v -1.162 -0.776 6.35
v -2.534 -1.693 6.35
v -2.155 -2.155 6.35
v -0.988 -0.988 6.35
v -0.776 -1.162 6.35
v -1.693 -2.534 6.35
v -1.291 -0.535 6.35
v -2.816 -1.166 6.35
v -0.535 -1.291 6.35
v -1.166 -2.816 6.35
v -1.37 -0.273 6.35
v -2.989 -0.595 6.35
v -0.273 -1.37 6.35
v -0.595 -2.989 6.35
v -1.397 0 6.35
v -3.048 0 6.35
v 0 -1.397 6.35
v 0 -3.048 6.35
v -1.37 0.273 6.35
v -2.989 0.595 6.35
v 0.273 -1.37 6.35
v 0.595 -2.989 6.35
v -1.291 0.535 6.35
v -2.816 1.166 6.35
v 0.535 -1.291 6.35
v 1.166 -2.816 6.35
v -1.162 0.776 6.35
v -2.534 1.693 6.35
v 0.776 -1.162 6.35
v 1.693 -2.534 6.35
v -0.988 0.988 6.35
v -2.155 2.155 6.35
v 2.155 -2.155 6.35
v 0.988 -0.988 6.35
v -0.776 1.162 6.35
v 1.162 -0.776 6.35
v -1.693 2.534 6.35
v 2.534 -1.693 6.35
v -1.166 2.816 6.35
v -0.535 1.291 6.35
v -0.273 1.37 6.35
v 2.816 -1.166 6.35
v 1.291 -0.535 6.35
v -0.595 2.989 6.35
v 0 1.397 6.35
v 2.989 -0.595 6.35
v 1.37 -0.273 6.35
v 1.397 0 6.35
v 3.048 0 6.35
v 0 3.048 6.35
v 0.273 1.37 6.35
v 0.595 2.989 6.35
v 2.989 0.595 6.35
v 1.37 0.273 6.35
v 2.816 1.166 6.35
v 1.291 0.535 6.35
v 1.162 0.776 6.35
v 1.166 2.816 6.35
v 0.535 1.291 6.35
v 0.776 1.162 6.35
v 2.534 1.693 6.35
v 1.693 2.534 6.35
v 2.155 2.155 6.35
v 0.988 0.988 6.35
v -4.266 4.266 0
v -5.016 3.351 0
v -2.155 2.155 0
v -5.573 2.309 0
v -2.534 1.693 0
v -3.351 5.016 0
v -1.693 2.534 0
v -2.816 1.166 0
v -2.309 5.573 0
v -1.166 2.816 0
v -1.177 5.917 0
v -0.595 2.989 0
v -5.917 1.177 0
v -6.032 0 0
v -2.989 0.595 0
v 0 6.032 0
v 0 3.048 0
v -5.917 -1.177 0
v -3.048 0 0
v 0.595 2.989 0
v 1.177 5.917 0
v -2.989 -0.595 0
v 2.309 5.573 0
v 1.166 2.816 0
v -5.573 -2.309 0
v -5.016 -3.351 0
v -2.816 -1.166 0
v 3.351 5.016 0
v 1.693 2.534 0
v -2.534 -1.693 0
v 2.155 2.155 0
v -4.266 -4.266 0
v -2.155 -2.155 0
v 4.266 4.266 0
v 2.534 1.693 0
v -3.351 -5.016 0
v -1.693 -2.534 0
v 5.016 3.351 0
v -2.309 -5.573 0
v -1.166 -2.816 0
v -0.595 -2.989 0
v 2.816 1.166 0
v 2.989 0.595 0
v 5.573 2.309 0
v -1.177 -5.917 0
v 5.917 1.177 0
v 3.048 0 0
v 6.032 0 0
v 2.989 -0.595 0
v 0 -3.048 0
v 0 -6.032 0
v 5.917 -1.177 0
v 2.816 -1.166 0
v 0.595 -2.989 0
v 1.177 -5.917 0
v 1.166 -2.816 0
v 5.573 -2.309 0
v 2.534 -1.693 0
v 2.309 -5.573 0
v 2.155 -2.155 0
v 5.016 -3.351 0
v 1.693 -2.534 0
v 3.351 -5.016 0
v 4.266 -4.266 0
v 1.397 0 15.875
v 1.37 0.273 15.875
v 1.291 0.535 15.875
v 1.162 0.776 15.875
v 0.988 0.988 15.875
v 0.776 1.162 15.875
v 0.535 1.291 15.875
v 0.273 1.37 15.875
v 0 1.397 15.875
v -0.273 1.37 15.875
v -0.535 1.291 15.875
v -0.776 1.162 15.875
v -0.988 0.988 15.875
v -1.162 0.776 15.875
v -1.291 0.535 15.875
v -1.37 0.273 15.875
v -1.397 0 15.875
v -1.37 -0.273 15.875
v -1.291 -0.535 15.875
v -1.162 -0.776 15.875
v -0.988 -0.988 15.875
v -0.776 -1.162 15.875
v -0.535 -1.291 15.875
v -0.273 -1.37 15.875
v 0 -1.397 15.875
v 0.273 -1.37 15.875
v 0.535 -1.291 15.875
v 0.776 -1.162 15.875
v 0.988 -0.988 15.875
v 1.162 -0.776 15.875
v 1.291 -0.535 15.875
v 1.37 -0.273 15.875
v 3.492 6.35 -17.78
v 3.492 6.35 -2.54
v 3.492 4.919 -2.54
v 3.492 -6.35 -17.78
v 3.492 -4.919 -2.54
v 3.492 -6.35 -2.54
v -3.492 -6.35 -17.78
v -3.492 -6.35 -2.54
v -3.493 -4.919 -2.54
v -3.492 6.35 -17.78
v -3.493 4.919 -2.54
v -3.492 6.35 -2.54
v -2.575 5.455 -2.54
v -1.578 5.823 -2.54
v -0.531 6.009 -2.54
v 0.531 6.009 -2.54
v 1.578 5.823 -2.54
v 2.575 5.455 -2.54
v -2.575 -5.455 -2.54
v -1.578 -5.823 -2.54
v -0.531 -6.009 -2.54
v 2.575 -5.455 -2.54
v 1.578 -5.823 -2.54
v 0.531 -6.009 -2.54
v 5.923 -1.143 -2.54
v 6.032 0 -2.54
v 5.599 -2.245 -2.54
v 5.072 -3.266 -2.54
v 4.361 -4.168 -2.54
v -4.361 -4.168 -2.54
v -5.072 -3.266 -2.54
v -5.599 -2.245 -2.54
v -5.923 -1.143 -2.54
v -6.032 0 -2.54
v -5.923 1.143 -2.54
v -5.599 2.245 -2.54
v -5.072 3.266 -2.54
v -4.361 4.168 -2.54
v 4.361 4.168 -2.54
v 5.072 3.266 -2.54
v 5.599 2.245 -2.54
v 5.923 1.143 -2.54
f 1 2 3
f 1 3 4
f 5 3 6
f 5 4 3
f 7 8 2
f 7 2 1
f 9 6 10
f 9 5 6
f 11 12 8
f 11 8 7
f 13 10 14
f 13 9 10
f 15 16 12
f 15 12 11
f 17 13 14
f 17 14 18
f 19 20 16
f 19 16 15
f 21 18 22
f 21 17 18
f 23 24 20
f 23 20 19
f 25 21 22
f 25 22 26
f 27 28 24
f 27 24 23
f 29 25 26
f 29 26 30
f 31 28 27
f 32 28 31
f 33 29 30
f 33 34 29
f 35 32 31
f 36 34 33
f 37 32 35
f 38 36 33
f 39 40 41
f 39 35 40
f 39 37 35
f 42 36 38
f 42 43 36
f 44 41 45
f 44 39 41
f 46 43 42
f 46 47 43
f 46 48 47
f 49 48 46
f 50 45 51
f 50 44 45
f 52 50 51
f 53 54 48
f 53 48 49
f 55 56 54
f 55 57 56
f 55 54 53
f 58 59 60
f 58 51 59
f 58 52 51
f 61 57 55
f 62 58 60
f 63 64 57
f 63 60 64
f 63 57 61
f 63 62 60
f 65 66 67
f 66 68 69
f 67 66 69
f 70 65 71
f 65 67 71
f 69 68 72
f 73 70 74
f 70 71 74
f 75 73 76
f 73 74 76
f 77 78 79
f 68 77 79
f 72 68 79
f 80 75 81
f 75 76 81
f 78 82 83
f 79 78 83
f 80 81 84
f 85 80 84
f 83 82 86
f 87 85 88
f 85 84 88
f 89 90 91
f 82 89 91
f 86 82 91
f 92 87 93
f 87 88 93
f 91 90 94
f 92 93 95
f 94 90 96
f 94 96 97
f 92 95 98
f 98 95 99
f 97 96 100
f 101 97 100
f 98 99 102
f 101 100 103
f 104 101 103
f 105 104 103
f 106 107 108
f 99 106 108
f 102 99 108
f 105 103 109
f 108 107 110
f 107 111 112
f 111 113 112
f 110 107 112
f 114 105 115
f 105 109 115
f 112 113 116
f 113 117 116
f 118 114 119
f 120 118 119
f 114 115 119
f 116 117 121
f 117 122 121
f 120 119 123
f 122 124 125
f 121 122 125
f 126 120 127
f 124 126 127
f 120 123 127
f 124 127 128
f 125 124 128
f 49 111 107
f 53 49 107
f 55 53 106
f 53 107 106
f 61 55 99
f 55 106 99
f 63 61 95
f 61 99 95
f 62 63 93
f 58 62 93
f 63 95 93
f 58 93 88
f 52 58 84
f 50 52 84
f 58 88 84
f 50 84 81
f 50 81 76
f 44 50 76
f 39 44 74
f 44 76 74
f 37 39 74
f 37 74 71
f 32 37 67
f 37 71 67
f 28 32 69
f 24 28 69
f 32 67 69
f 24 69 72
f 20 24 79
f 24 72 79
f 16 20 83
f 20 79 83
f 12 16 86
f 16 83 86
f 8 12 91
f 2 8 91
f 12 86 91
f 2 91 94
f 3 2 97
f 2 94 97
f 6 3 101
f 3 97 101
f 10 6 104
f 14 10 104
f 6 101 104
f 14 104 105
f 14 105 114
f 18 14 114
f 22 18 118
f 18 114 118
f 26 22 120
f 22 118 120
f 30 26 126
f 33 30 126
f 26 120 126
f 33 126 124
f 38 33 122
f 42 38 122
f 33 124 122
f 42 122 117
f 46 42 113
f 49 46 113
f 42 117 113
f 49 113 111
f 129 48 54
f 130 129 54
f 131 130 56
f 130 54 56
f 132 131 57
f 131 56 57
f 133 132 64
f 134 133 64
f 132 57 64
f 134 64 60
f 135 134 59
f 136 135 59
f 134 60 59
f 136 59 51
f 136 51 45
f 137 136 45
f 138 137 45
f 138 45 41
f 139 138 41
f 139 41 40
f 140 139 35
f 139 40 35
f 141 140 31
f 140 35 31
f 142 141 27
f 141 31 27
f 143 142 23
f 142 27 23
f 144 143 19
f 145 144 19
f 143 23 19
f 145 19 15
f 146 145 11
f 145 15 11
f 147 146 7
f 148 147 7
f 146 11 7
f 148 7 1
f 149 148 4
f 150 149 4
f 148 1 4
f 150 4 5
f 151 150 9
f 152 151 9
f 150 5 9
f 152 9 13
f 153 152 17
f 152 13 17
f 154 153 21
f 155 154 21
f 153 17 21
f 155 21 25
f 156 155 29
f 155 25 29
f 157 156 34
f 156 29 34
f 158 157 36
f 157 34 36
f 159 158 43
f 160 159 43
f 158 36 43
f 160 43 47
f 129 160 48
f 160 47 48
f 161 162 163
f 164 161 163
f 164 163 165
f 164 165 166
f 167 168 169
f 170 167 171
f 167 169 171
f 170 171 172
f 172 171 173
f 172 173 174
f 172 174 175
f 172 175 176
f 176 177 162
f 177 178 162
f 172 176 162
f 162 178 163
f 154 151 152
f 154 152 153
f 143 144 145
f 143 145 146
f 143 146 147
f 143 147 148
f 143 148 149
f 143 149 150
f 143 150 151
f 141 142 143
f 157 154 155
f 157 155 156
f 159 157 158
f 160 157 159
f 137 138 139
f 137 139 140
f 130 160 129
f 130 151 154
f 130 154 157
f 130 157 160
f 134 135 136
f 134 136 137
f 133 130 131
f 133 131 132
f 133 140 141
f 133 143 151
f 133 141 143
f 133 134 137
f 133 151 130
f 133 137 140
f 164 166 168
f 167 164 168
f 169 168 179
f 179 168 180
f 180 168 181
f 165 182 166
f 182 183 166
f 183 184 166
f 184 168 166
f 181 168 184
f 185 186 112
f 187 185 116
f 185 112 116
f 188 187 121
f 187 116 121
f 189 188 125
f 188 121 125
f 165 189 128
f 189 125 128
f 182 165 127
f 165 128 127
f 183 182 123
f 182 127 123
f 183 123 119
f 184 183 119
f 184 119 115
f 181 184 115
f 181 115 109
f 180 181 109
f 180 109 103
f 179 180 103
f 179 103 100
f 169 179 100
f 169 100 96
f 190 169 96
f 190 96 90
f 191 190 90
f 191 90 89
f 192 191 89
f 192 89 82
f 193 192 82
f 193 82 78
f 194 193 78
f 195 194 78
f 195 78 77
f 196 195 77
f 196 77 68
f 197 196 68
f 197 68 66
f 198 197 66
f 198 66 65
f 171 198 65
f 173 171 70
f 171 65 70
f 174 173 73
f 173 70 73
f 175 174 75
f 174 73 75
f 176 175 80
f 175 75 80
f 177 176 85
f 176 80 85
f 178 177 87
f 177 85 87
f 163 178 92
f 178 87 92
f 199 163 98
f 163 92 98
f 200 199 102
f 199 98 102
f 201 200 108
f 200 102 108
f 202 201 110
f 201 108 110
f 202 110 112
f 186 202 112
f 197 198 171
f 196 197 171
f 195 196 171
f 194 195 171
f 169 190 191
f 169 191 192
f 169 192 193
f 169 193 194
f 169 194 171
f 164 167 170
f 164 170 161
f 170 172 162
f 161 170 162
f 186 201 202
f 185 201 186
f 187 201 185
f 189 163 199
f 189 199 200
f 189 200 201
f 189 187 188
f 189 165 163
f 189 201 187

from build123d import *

# Parameters (mm, degrees)
F0_R     = 3.048
F1_DEPTH = 6.35
F2_R     = 6.0325
F2_R_2   = 3.048
F3_DEPTH = 2.54
F5_DEPTH = 15.24
F6_R     = 1.397
F7_DEPTH = 9.525


with BuildPart() as f1:
    # F0 (on Top) → F1 (new body)
    with BuildSketch(Plane.XY):
        Circle(F0_R)
    extrude(amount=F1_DEPTH)

    # F2 (on face) → F3 (join)
    with BuildSketch(Plane(origin=(0, 0, 0), x_dir=(1, 0, 0), z_dir=(0, 0, -1))):
        Circle(F2_R)
        Circle(F2_R_2, mode=Mode.SUBTRACT)
        Circle(F2_R_2)
    extrude(amount=F3_DEPTH)

    # F4 (on face) → F5 (join)
    with BuildSketch(Plane(origin=(0, 0, -2.54), x_dir=(1, 0, 0), z_dir=(0, 0, -1))):
        Polygon((3.4925, -6.35), (-3.4925, 6.35), (-3.4925, -6.35), align=None)
        Polygon((3.4925, 6.35), (-3.4925, 6.35), (3.4925, -6.35), align=None)
    extrude(amount=F5_DEPTH)

    # F6 (on face) → F7 (join)
    with BuildSketch(Plane.XY.offset(6.35)):
        Circle(F6_R)
    extrude(amount=F7_DEPTH)


solid = f1.part
